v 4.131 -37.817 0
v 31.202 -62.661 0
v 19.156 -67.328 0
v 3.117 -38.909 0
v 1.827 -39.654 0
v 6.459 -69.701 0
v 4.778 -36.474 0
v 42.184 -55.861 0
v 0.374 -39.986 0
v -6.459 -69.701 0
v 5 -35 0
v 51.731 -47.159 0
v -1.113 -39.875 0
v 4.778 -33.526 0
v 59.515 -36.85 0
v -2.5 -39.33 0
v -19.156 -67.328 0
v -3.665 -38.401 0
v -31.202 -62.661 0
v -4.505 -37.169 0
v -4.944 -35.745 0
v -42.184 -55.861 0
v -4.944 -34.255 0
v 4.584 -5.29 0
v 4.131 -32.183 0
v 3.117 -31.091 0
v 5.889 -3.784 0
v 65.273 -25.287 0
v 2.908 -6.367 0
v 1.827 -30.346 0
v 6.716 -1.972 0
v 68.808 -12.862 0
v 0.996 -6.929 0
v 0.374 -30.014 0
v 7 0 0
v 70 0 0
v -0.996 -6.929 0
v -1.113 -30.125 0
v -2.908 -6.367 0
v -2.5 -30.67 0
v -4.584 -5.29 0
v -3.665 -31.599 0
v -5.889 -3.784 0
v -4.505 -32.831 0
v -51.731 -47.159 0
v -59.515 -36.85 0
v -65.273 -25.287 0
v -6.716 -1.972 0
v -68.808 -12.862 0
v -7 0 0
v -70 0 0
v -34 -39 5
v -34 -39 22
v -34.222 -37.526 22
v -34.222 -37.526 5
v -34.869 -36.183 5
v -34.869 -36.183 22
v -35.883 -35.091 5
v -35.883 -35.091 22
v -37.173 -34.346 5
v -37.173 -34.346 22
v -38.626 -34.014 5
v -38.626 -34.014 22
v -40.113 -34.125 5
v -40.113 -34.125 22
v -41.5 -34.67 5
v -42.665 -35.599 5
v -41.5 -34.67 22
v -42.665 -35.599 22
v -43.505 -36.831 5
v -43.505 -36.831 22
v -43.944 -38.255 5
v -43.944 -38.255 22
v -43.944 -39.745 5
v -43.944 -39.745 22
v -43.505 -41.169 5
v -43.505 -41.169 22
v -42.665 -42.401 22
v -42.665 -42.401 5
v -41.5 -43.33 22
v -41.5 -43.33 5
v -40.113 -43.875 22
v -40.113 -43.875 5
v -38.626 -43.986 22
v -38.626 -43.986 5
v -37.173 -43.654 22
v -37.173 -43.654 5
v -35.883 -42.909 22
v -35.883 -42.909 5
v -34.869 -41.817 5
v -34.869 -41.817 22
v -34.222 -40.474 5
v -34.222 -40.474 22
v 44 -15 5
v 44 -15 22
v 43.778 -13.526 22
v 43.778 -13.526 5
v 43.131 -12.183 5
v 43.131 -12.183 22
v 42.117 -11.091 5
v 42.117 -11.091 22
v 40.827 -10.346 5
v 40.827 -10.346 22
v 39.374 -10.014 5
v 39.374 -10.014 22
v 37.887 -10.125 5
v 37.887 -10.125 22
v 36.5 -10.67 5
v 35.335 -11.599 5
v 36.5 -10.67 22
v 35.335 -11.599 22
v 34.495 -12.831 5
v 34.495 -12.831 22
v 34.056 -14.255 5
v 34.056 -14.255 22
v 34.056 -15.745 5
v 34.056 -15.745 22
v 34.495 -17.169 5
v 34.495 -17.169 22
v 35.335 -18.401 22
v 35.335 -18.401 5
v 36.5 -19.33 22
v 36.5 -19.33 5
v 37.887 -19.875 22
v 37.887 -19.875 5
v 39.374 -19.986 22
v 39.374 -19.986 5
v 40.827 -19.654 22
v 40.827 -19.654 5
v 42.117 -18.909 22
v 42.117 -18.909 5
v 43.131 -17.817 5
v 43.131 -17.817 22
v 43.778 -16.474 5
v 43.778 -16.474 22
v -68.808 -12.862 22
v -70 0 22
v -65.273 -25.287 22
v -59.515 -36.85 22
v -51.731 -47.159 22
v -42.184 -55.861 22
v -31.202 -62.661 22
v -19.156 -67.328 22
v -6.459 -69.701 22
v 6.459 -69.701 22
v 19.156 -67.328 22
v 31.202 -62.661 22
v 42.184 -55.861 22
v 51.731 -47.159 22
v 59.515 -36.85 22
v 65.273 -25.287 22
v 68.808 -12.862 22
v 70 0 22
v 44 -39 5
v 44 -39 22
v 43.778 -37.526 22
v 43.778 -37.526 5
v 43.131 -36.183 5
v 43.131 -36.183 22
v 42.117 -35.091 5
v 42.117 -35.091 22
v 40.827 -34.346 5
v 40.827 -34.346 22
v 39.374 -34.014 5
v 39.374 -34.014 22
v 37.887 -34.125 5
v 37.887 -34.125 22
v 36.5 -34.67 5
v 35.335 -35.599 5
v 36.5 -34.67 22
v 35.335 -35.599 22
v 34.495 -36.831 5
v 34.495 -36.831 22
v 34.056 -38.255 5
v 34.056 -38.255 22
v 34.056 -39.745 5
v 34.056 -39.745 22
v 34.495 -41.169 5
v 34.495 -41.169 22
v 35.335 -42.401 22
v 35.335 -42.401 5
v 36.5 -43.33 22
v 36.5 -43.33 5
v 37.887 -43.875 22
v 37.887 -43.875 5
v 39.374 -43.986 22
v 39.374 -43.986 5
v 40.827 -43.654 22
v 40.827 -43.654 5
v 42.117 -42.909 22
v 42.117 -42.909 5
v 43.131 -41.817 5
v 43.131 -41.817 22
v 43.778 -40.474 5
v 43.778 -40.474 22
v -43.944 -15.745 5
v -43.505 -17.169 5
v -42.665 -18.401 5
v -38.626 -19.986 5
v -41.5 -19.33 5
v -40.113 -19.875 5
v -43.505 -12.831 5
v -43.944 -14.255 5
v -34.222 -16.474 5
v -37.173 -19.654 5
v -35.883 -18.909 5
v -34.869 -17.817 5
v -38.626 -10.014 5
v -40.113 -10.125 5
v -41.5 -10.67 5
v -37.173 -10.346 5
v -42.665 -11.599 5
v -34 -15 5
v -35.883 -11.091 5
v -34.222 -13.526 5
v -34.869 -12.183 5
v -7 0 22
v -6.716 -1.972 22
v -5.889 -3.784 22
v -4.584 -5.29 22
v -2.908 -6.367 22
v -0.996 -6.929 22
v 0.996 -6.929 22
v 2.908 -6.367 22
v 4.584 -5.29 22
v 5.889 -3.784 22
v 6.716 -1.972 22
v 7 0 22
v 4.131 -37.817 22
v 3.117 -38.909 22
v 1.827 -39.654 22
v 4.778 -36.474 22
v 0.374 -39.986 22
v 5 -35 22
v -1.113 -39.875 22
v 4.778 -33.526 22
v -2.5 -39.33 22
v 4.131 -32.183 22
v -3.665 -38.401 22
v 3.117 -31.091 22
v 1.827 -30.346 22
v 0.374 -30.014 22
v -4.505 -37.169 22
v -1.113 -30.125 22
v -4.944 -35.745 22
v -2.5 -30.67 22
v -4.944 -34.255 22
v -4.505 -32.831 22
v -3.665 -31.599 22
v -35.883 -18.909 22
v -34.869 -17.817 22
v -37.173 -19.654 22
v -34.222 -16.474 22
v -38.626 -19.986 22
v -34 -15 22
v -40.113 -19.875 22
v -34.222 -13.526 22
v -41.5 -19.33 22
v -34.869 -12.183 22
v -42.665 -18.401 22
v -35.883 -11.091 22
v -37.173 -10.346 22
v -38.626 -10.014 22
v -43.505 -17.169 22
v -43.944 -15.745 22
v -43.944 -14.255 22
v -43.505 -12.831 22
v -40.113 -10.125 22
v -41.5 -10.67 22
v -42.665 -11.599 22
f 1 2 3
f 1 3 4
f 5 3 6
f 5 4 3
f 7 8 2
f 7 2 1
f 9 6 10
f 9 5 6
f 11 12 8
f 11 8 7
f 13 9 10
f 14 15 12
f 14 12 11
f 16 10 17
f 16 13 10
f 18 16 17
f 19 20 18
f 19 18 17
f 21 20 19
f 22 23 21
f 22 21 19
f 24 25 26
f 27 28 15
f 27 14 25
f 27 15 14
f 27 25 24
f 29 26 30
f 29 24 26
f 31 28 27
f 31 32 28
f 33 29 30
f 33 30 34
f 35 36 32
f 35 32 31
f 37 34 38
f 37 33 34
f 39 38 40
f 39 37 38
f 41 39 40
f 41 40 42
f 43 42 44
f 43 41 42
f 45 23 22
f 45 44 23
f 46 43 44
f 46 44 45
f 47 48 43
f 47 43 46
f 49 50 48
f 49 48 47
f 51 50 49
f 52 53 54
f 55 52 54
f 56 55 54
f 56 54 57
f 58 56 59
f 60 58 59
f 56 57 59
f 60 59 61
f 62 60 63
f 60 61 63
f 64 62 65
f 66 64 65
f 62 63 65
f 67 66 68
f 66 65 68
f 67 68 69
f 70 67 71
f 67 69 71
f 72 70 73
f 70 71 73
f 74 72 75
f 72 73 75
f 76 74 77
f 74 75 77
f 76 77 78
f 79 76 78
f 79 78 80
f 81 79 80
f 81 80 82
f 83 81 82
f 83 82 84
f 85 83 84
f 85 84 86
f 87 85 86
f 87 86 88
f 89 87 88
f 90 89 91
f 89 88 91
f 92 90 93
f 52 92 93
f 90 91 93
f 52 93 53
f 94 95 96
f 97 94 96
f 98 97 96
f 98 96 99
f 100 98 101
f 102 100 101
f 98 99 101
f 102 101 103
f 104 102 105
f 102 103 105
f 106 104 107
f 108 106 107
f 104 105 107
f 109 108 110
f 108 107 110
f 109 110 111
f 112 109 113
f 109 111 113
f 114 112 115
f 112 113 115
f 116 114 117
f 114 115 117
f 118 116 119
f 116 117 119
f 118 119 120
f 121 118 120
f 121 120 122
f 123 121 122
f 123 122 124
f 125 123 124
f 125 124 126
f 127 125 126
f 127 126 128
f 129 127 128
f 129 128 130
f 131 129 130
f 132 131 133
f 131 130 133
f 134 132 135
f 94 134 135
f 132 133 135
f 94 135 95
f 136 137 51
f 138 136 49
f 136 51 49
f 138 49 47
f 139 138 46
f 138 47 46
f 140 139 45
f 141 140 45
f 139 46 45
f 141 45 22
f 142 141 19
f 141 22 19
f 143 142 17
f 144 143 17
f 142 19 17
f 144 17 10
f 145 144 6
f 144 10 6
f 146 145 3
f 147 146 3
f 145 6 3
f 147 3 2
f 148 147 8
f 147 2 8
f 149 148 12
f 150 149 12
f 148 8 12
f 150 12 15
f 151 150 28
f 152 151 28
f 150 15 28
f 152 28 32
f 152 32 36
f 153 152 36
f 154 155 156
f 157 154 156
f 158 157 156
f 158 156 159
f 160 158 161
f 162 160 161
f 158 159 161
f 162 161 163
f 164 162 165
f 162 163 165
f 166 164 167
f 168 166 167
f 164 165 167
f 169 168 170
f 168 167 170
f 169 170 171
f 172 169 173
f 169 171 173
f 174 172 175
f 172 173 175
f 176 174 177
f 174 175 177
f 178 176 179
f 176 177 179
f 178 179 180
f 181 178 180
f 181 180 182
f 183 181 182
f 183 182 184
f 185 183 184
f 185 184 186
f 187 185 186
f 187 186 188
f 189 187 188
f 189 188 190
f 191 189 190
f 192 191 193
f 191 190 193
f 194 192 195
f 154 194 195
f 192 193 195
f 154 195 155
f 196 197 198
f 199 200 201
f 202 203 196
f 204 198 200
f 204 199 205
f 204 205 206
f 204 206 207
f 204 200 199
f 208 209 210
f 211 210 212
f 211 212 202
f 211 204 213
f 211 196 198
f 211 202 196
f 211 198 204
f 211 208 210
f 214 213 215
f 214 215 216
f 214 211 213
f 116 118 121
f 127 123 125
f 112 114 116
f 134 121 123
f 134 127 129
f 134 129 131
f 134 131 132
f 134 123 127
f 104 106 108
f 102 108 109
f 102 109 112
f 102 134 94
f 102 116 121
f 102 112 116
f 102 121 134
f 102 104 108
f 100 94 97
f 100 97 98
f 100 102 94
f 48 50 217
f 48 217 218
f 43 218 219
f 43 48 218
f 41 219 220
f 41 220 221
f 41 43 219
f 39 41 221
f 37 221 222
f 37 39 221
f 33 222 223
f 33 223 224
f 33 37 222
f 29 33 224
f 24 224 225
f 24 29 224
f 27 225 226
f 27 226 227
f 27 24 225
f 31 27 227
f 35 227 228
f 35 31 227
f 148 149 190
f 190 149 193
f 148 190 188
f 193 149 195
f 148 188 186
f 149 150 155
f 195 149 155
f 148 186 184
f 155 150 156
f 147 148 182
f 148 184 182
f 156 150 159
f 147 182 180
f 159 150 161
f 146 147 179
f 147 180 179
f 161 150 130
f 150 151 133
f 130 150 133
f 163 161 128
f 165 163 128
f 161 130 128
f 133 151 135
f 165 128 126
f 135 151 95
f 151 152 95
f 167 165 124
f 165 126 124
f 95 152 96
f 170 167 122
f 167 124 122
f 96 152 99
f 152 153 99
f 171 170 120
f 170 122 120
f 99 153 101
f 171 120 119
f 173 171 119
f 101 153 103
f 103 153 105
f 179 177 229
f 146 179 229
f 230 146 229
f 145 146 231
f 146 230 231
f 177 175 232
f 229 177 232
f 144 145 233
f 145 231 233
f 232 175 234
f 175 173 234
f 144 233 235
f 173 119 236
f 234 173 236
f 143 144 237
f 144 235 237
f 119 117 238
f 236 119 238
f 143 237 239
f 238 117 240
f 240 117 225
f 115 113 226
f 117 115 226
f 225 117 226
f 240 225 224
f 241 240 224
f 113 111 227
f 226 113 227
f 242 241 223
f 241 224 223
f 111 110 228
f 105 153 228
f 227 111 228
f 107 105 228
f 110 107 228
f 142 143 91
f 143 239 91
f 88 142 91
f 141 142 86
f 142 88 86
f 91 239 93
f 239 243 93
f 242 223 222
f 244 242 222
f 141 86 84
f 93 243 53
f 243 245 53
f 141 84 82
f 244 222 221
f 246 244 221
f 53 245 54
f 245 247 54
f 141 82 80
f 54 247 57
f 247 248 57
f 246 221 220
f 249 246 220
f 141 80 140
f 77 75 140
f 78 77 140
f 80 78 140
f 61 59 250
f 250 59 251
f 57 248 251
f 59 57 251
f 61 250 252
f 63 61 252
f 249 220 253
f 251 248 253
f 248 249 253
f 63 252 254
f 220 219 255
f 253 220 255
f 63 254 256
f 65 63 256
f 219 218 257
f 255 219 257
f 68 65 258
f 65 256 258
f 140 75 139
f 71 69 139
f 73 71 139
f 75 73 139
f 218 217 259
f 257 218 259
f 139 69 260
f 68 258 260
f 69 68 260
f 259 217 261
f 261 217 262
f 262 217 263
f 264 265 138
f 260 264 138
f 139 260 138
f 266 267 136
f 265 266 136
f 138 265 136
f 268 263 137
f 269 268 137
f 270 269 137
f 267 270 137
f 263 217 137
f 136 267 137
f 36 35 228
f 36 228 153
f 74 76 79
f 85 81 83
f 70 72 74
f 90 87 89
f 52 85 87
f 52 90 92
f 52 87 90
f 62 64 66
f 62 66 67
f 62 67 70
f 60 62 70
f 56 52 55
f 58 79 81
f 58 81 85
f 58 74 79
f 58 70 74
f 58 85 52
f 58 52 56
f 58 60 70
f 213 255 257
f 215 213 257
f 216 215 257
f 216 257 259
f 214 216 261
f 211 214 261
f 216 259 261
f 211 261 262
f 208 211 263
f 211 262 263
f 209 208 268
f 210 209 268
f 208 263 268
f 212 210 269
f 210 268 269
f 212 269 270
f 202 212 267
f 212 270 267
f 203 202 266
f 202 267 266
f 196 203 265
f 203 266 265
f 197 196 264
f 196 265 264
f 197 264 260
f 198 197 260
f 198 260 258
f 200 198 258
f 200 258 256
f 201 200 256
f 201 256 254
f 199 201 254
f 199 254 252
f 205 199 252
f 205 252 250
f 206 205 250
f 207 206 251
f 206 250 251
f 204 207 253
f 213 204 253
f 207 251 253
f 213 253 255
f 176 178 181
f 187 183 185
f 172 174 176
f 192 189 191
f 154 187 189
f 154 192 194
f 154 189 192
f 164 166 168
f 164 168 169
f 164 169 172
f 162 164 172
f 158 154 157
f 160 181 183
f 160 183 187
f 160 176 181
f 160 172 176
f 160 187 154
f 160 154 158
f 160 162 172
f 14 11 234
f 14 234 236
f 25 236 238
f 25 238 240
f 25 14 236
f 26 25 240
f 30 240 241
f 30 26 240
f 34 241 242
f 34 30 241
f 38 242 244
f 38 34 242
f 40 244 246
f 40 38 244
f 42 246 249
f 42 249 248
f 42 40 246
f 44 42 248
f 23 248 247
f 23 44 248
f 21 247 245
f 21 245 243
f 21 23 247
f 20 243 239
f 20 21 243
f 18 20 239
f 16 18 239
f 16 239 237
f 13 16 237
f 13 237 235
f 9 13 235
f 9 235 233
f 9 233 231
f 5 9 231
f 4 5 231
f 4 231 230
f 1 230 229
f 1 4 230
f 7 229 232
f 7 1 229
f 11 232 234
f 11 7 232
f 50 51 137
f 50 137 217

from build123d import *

# Parameters (mm, degrees)
PAD_DEPTH       = 22
SKETCH001_R     = 5
PAD001_DEPTH    = 17
POCKET_DEPTH    = 17
SKETCH002_R     = 5
POCKET001_DEPTH = 22


with BuildPart() as part:
    # Sketch → Pad (new body)
    with BuildSketch(Plane.XY):
        with BuildLine():
            ThreePointArc((-7, 0), (0, -7), (7, 0))
            Line((7, 0), (70, 0))
            ThreePointArc((-70, 0), (0, -70), (70, 0))
            Line((-70, 0), (-7, 0))
        make_face()
    extrude(amount=PAD_DEPTH)

    # Sketch001 (on Face6 of Pad) → Pad001 (join)
    with BuildSketch(Plane.XY.offset(22)):
        with Locations((-39, -39)):
            Circle(SKETCH001_R)
        with Locations((39, -39)):
            Circle(SKETCH001_R)
        with Locations((-39, -15)):
            Circle(SKETCH001_R)
        with Locations((39, -15)):
            Circle(SKETCH001_R)
    extrude(amount=-PAD001_DEPTH)

    # Sketch001 (on Face6 of Pad) → Pocket (cut)
    with BuildSketch(Plane.XY.offset(22)):
        with Locations((-39, -39)):
            Circle(SKETCH001_R)
        with Locations((39, -39)):
            Circle(SKETCH001_R)
        with Locations((-39, -15)):
            Circle(SKETCH001_R)
        with Locations((39, -15)):
            Circle(SKETCH001_R)
    extrude(amount=-POCKET_DEPTH, mode=Mode.SUBTRACT)

    # Sketch002 → Pocket001 (cut)
    with BuildSketch(Plane.XY):
        with Locations((0, -35)):
            Circle(SKETCH002_R)
    extrude(amount=POCKET001_DEPTH, mode=Mode.SUBTRACT)


solid = part.part
